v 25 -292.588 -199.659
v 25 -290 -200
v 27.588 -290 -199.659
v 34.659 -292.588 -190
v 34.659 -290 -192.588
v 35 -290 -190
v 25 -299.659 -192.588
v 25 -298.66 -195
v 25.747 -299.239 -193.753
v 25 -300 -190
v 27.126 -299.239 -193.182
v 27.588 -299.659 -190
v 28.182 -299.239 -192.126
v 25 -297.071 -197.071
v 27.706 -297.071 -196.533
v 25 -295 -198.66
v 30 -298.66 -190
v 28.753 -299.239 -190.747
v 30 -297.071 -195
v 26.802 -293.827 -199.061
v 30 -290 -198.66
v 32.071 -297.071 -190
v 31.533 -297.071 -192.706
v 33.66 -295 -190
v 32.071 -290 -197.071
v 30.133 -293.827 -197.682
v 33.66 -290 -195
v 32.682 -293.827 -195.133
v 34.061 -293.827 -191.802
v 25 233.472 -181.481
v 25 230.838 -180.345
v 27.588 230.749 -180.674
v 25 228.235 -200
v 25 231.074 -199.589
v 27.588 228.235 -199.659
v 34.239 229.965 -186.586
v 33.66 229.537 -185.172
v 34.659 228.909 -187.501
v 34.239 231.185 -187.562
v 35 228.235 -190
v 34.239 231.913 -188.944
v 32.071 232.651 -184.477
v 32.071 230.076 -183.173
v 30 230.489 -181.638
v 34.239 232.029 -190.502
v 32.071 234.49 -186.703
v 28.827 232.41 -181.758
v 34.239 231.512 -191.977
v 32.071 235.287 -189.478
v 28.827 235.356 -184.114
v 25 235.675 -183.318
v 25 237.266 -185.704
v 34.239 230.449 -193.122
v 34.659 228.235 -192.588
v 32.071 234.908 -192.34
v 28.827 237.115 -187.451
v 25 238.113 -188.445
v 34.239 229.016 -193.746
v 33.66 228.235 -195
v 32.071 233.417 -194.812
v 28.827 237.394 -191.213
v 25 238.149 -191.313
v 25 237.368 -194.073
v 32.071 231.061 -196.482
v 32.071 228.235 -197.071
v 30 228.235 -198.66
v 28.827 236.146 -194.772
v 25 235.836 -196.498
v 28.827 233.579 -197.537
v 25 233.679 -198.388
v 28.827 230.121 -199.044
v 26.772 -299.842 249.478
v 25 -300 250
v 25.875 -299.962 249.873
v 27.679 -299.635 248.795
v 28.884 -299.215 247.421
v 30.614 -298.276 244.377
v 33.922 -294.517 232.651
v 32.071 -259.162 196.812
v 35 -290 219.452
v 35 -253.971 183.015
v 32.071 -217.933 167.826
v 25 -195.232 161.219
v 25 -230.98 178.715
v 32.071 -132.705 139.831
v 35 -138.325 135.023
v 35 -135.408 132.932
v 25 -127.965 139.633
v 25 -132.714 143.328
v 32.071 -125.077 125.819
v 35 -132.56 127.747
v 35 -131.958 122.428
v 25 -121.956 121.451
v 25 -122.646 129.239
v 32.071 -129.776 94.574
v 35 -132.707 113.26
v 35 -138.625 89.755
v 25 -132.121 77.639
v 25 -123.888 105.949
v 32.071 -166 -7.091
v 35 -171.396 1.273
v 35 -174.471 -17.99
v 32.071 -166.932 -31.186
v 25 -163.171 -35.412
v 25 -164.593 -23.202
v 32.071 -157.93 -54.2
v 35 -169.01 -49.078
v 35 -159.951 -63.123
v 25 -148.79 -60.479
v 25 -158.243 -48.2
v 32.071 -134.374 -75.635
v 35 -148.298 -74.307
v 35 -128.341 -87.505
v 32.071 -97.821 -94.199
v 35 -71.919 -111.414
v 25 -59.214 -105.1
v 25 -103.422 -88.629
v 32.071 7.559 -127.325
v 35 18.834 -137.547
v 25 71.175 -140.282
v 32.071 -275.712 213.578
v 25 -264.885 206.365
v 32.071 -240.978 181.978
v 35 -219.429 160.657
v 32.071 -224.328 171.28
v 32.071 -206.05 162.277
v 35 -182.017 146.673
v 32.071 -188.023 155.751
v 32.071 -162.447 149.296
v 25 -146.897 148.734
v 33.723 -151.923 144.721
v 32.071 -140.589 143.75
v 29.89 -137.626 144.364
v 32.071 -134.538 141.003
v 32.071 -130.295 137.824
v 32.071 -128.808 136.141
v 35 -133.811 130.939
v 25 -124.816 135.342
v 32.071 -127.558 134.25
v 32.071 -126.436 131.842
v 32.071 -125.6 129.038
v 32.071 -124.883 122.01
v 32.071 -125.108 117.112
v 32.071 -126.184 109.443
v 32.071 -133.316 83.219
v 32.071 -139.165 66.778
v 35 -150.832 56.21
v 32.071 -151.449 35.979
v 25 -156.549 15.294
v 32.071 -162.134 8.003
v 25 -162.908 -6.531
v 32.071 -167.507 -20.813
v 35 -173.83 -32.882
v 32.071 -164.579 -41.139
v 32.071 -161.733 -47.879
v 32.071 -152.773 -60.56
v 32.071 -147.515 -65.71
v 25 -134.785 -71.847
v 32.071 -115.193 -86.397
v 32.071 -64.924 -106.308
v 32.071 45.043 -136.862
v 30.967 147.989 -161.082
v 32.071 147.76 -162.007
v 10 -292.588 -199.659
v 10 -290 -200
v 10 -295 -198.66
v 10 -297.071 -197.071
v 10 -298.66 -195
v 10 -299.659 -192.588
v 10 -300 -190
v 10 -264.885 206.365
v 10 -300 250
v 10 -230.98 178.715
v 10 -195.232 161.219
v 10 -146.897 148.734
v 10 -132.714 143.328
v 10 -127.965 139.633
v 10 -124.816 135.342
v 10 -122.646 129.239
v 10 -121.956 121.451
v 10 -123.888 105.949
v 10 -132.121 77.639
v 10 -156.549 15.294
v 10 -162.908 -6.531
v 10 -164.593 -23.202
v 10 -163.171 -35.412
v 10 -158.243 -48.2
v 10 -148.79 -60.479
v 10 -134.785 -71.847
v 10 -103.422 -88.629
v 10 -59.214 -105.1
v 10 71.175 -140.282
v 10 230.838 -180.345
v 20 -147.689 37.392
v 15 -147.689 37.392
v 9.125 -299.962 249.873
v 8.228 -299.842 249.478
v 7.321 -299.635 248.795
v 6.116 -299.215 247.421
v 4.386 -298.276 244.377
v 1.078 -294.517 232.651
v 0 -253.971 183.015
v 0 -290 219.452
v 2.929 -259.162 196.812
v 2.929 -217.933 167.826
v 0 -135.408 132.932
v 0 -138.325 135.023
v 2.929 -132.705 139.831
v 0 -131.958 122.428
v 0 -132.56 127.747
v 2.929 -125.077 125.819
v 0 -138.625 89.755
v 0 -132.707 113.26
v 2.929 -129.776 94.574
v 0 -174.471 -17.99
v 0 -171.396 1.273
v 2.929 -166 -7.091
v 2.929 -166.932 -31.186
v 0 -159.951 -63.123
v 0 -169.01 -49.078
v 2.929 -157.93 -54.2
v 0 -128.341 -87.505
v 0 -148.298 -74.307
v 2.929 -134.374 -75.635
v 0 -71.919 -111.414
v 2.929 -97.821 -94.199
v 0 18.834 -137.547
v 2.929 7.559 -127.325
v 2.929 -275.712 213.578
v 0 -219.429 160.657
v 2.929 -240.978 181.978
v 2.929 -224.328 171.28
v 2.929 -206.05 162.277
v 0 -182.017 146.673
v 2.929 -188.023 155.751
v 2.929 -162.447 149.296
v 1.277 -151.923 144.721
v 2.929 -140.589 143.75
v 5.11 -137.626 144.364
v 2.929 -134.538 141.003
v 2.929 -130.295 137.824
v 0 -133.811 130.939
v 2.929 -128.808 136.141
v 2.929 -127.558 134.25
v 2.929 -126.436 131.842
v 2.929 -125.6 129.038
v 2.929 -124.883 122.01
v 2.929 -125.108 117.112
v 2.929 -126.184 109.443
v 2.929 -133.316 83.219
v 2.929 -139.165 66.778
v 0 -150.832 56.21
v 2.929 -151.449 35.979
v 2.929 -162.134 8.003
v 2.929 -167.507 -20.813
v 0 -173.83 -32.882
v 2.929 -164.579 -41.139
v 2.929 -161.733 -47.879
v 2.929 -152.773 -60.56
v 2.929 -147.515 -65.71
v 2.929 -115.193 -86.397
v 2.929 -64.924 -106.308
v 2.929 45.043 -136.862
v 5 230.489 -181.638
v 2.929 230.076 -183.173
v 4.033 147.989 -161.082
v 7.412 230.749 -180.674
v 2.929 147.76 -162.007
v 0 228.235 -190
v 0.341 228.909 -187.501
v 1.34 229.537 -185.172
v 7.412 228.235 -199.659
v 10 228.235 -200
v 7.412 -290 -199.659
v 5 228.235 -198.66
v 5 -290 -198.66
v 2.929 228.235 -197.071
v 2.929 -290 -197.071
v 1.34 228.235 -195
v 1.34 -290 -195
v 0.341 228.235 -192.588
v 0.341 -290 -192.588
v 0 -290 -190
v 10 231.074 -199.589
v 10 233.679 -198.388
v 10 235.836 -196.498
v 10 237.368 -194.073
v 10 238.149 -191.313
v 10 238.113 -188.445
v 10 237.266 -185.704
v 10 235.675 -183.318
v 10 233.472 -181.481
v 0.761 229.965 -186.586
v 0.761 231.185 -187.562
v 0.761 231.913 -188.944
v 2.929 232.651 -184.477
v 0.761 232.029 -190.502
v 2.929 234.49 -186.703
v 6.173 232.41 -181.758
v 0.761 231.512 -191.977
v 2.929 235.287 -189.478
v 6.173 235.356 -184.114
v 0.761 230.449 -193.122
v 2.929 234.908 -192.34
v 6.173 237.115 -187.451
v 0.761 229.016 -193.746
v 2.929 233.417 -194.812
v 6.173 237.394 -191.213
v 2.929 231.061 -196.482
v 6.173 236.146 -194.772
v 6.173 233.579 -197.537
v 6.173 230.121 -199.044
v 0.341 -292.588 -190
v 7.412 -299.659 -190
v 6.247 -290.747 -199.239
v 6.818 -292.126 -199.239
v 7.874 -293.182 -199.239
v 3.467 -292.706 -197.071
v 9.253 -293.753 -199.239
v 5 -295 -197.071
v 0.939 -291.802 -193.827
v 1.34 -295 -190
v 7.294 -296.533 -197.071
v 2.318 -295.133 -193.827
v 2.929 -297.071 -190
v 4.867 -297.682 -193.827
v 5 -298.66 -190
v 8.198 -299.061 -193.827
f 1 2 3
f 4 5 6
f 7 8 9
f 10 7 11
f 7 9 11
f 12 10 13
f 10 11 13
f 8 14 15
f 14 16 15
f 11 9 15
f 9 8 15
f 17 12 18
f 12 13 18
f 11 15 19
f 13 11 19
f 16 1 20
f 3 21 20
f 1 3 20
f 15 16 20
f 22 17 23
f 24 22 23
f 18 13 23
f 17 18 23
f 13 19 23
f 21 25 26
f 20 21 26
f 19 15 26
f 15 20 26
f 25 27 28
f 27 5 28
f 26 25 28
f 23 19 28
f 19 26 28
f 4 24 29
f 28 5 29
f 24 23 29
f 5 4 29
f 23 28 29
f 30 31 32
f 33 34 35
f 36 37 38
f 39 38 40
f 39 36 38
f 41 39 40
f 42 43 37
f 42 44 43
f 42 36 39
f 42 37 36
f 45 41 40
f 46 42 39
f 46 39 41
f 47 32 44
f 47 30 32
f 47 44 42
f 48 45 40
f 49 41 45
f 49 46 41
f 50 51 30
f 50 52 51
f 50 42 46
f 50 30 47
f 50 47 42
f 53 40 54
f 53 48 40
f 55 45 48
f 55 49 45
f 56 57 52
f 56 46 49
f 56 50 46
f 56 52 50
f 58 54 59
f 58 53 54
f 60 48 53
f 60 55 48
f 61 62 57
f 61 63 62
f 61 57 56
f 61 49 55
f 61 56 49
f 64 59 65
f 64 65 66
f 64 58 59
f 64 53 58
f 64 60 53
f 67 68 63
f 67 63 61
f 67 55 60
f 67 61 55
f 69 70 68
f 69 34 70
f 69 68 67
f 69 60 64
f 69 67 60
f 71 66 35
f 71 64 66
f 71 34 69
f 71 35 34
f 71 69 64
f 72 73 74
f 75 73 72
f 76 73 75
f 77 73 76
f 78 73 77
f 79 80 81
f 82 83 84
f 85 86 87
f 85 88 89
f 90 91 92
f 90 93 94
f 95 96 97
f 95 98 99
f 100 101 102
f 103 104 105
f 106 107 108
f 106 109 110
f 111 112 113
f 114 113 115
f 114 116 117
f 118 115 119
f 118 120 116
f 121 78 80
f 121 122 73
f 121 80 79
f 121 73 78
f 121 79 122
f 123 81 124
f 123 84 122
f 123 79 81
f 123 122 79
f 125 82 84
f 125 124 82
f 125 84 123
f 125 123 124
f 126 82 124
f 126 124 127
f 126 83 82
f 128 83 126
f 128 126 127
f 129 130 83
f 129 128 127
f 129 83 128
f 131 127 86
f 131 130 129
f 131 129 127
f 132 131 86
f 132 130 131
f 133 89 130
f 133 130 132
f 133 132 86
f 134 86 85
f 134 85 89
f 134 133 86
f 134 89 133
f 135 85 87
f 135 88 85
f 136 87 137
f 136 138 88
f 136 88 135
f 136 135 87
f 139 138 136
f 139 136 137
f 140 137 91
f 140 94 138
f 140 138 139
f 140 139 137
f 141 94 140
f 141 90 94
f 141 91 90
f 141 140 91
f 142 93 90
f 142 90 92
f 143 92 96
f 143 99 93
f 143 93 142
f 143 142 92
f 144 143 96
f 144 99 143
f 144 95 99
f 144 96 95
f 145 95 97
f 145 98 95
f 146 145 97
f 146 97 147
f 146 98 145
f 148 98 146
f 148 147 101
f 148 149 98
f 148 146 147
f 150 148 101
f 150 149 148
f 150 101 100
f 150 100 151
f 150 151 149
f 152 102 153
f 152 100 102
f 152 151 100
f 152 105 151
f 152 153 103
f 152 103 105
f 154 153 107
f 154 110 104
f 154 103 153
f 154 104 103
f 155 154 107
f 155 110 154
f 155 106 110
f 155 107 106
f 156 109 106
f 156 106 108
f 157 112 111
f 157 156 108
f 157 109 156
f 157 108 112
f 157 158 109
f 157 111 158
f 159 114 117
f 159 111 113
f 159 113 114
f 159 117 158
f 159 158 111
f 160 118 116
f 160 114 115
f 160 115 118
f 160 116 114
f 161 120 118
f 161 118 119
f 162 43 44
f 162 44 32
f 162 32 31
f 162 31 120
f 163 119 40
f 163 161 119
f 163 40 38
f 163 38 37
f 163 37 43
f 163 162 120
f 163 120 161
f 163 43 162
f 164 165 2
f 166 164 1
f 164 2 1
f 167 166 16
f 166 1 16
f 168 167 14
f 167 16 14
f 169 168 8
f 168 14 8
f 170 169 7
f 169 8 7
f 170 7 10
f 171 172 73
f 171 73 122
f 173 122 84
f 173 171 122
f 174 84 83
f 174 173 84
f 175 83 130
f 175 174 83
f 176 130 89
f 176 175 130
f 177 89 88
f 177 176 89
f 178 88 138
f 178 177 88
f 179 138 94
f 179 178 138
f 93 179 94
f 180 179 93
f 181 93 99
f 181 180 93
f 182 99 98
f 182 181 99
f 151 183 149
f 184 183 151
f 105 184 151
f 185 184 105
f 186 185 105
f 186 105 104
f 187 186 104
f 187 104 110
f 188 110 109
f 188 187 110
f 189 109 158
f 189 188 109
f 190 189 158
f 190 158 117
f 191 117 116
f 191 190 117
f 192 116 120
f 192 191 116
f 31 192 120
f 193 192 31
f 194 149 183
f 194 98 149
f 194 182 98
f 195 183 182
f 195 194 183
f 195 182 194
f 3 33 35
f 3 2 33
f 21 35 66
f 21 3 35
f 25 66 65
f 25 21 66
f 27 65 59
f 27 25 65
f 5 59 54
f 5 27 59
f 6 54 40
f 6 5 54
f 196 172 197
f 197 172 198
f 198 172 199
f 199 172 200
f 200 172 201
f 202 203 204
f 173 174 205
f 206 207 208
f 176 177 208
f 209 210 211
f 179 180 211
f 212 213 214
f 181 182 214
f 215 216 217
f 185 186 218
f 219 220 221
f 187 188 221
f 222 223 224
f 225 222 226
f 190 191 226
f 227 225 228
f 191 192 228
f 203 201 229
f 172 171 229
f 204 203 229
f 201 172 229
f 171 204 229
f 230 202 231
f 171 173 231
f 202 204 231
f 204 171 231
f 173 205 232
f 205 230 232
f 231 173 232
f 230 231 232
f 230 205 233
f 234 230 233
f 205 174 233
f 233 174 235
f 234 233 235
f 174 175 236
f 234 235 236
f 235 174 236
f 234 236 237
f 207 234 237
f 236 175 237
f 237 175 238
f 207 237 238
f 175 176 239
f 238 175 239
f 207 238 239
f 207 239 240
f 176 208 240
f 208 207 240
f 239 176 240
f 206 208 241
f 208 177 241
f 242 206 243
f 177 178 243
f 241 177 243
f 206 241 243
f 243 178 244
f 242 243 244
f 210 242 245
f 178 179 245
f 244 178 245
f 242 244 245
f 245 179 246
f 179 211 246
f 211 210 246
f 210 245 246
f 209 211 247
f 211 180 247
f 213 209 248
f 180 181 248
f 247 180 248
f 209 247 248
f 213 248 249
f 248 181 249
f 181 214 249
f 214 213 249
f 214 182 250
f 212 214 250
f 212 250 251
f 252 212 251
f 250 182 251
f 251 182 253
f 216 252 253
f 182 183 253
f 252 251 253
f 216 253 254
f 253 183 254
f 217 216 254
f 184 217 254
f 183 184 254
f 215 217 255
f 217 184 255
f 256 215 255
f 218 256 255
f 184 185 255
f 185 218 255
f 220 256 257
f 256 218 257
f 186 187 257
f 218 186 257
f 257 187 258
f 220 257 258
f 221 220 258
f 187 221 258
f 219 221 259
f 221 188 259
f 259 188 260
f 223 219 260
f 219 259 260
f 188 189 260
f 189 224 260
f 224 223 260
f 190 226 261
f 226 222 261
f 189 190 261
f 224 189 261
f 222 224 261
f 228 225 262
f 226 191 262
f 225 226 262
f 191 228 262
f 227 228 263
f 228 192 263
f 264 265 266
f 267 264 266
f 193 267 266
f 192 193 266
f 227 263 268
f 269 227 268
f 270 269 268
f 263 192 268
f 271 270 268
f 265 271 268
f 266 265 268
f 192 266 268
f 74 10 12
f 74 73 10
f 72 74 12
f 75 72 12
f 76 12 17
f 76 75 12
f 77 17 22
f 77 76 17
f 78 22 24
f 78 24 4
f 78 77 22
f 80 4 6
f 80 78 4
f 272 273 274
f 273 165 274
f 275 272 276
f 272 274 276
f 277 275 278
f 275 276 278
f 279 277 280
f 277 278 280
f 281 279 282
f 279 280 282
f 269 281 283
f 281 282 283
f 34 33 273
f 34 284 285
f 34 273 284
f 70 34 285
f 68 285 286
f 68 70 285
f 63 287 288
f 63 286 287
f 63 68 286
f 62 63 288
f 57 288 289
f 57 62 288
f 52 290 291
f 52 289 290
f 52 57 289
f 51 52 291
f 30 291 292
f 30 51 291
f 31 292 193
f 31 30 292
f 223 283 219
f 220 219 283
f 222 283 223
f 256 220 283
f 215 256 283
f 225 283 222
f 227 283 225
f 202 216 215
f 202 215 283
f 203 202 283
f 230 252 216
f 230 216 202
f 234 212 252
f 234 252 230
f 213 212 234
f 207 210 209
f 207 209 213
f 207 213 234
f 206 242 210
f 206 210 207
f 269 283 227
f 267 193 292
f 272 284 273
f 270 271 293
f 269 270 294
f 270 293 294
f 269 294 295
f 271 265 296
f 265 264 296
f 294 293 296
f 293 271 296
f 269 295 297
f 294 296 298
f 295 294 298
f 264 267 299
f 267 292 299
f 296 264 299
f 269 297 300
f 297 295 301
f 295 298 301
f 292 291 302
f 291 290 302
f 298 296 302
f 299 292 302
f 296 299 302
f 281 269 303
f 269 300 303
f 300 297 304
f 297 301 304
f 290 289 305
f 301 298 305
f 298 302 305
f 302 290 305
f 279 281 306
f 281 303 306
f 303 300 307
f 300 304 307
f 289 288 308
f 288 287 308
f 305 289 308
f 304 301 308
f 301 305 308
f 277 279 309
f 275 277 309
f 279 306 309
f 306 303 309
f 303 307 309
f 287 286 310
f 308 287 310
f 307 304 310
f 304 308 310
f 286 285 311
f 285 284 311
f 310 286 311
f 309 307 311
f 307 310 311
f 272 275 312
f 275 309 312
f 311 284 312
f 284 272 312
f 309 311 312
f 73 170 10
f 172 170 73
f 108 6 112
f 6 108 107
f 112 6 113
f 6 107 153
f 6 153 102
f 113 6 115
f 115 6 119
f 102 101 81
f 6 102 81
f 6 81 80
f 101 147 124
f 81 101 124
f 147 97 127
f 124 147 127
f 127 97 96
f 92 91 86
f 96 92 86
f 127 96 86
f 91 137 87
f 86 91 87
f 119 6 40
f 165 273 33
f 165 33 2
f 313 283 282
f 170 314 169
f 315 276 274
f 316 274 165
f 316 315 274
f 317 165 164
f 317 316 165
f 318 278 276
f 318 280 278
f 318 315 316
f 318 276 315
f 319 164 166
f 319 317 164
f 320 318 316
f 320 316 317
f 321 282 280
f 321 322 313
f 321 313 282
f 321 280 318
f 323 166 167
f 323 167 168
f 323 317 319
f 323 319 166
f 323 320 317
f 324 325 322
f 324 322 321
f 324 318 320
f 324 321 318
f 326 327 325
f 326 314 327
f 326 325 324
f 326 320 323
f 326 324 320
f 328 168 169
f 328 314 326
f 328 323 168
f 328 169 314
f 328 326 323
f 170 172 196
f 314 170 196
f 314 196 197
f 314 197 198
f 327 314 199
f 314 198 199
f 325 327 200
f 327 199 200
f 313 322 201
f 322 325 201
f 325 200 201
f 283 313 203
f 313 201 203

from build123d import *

# Parameters (mm, degrees)
BOSS_EXTRUDE1_DEPTH = 35
FILLET1_R           = 10


with BuildPart() as part:
    # Sketch1 → Boss-Extrude1 (new body)
    with BuildSketch(Plane(origin=(0, 0, 0), x_dir=(0, 0, -1), z_dir=(1, 0, 0))):
        with BuildLine():
            Line((200, 300), (200, -300))
            Line((200, -300), (-250, -300))
            add(Edge.make_bspline(
                [(-250, -300), (-77.059584902, -184.893065318), (-248.459152651, -52.24601151), (99.988368939, -208.314346462), (136.290182987, 88.168752174), (200, 300)],
                knots=[0, 0, 0, 0, 0.685015843, 0.785015843, 1, 1, 1, 1], degree=3))
        make_face()
    extrude(amount=BOSS_EXTRUDE1_DEPTH)

    # Fillet1
    fillet1_edges = [part.edges().sort_by_distance(p)[0] for p in [
        (35, -129.592059108, -75.193671806),
        (0, -129.592059108, -75.193671806),
        (0, -300, 25),
        (0, 0, -200),
        (35, 0, -200),
        (17.5, 300, -200),
        (17.5, -300, -200),
        (35, -300, 25),
    ]]
    fillet(fillet1_edges, radius=FILLET1_R)


solid = part.part
